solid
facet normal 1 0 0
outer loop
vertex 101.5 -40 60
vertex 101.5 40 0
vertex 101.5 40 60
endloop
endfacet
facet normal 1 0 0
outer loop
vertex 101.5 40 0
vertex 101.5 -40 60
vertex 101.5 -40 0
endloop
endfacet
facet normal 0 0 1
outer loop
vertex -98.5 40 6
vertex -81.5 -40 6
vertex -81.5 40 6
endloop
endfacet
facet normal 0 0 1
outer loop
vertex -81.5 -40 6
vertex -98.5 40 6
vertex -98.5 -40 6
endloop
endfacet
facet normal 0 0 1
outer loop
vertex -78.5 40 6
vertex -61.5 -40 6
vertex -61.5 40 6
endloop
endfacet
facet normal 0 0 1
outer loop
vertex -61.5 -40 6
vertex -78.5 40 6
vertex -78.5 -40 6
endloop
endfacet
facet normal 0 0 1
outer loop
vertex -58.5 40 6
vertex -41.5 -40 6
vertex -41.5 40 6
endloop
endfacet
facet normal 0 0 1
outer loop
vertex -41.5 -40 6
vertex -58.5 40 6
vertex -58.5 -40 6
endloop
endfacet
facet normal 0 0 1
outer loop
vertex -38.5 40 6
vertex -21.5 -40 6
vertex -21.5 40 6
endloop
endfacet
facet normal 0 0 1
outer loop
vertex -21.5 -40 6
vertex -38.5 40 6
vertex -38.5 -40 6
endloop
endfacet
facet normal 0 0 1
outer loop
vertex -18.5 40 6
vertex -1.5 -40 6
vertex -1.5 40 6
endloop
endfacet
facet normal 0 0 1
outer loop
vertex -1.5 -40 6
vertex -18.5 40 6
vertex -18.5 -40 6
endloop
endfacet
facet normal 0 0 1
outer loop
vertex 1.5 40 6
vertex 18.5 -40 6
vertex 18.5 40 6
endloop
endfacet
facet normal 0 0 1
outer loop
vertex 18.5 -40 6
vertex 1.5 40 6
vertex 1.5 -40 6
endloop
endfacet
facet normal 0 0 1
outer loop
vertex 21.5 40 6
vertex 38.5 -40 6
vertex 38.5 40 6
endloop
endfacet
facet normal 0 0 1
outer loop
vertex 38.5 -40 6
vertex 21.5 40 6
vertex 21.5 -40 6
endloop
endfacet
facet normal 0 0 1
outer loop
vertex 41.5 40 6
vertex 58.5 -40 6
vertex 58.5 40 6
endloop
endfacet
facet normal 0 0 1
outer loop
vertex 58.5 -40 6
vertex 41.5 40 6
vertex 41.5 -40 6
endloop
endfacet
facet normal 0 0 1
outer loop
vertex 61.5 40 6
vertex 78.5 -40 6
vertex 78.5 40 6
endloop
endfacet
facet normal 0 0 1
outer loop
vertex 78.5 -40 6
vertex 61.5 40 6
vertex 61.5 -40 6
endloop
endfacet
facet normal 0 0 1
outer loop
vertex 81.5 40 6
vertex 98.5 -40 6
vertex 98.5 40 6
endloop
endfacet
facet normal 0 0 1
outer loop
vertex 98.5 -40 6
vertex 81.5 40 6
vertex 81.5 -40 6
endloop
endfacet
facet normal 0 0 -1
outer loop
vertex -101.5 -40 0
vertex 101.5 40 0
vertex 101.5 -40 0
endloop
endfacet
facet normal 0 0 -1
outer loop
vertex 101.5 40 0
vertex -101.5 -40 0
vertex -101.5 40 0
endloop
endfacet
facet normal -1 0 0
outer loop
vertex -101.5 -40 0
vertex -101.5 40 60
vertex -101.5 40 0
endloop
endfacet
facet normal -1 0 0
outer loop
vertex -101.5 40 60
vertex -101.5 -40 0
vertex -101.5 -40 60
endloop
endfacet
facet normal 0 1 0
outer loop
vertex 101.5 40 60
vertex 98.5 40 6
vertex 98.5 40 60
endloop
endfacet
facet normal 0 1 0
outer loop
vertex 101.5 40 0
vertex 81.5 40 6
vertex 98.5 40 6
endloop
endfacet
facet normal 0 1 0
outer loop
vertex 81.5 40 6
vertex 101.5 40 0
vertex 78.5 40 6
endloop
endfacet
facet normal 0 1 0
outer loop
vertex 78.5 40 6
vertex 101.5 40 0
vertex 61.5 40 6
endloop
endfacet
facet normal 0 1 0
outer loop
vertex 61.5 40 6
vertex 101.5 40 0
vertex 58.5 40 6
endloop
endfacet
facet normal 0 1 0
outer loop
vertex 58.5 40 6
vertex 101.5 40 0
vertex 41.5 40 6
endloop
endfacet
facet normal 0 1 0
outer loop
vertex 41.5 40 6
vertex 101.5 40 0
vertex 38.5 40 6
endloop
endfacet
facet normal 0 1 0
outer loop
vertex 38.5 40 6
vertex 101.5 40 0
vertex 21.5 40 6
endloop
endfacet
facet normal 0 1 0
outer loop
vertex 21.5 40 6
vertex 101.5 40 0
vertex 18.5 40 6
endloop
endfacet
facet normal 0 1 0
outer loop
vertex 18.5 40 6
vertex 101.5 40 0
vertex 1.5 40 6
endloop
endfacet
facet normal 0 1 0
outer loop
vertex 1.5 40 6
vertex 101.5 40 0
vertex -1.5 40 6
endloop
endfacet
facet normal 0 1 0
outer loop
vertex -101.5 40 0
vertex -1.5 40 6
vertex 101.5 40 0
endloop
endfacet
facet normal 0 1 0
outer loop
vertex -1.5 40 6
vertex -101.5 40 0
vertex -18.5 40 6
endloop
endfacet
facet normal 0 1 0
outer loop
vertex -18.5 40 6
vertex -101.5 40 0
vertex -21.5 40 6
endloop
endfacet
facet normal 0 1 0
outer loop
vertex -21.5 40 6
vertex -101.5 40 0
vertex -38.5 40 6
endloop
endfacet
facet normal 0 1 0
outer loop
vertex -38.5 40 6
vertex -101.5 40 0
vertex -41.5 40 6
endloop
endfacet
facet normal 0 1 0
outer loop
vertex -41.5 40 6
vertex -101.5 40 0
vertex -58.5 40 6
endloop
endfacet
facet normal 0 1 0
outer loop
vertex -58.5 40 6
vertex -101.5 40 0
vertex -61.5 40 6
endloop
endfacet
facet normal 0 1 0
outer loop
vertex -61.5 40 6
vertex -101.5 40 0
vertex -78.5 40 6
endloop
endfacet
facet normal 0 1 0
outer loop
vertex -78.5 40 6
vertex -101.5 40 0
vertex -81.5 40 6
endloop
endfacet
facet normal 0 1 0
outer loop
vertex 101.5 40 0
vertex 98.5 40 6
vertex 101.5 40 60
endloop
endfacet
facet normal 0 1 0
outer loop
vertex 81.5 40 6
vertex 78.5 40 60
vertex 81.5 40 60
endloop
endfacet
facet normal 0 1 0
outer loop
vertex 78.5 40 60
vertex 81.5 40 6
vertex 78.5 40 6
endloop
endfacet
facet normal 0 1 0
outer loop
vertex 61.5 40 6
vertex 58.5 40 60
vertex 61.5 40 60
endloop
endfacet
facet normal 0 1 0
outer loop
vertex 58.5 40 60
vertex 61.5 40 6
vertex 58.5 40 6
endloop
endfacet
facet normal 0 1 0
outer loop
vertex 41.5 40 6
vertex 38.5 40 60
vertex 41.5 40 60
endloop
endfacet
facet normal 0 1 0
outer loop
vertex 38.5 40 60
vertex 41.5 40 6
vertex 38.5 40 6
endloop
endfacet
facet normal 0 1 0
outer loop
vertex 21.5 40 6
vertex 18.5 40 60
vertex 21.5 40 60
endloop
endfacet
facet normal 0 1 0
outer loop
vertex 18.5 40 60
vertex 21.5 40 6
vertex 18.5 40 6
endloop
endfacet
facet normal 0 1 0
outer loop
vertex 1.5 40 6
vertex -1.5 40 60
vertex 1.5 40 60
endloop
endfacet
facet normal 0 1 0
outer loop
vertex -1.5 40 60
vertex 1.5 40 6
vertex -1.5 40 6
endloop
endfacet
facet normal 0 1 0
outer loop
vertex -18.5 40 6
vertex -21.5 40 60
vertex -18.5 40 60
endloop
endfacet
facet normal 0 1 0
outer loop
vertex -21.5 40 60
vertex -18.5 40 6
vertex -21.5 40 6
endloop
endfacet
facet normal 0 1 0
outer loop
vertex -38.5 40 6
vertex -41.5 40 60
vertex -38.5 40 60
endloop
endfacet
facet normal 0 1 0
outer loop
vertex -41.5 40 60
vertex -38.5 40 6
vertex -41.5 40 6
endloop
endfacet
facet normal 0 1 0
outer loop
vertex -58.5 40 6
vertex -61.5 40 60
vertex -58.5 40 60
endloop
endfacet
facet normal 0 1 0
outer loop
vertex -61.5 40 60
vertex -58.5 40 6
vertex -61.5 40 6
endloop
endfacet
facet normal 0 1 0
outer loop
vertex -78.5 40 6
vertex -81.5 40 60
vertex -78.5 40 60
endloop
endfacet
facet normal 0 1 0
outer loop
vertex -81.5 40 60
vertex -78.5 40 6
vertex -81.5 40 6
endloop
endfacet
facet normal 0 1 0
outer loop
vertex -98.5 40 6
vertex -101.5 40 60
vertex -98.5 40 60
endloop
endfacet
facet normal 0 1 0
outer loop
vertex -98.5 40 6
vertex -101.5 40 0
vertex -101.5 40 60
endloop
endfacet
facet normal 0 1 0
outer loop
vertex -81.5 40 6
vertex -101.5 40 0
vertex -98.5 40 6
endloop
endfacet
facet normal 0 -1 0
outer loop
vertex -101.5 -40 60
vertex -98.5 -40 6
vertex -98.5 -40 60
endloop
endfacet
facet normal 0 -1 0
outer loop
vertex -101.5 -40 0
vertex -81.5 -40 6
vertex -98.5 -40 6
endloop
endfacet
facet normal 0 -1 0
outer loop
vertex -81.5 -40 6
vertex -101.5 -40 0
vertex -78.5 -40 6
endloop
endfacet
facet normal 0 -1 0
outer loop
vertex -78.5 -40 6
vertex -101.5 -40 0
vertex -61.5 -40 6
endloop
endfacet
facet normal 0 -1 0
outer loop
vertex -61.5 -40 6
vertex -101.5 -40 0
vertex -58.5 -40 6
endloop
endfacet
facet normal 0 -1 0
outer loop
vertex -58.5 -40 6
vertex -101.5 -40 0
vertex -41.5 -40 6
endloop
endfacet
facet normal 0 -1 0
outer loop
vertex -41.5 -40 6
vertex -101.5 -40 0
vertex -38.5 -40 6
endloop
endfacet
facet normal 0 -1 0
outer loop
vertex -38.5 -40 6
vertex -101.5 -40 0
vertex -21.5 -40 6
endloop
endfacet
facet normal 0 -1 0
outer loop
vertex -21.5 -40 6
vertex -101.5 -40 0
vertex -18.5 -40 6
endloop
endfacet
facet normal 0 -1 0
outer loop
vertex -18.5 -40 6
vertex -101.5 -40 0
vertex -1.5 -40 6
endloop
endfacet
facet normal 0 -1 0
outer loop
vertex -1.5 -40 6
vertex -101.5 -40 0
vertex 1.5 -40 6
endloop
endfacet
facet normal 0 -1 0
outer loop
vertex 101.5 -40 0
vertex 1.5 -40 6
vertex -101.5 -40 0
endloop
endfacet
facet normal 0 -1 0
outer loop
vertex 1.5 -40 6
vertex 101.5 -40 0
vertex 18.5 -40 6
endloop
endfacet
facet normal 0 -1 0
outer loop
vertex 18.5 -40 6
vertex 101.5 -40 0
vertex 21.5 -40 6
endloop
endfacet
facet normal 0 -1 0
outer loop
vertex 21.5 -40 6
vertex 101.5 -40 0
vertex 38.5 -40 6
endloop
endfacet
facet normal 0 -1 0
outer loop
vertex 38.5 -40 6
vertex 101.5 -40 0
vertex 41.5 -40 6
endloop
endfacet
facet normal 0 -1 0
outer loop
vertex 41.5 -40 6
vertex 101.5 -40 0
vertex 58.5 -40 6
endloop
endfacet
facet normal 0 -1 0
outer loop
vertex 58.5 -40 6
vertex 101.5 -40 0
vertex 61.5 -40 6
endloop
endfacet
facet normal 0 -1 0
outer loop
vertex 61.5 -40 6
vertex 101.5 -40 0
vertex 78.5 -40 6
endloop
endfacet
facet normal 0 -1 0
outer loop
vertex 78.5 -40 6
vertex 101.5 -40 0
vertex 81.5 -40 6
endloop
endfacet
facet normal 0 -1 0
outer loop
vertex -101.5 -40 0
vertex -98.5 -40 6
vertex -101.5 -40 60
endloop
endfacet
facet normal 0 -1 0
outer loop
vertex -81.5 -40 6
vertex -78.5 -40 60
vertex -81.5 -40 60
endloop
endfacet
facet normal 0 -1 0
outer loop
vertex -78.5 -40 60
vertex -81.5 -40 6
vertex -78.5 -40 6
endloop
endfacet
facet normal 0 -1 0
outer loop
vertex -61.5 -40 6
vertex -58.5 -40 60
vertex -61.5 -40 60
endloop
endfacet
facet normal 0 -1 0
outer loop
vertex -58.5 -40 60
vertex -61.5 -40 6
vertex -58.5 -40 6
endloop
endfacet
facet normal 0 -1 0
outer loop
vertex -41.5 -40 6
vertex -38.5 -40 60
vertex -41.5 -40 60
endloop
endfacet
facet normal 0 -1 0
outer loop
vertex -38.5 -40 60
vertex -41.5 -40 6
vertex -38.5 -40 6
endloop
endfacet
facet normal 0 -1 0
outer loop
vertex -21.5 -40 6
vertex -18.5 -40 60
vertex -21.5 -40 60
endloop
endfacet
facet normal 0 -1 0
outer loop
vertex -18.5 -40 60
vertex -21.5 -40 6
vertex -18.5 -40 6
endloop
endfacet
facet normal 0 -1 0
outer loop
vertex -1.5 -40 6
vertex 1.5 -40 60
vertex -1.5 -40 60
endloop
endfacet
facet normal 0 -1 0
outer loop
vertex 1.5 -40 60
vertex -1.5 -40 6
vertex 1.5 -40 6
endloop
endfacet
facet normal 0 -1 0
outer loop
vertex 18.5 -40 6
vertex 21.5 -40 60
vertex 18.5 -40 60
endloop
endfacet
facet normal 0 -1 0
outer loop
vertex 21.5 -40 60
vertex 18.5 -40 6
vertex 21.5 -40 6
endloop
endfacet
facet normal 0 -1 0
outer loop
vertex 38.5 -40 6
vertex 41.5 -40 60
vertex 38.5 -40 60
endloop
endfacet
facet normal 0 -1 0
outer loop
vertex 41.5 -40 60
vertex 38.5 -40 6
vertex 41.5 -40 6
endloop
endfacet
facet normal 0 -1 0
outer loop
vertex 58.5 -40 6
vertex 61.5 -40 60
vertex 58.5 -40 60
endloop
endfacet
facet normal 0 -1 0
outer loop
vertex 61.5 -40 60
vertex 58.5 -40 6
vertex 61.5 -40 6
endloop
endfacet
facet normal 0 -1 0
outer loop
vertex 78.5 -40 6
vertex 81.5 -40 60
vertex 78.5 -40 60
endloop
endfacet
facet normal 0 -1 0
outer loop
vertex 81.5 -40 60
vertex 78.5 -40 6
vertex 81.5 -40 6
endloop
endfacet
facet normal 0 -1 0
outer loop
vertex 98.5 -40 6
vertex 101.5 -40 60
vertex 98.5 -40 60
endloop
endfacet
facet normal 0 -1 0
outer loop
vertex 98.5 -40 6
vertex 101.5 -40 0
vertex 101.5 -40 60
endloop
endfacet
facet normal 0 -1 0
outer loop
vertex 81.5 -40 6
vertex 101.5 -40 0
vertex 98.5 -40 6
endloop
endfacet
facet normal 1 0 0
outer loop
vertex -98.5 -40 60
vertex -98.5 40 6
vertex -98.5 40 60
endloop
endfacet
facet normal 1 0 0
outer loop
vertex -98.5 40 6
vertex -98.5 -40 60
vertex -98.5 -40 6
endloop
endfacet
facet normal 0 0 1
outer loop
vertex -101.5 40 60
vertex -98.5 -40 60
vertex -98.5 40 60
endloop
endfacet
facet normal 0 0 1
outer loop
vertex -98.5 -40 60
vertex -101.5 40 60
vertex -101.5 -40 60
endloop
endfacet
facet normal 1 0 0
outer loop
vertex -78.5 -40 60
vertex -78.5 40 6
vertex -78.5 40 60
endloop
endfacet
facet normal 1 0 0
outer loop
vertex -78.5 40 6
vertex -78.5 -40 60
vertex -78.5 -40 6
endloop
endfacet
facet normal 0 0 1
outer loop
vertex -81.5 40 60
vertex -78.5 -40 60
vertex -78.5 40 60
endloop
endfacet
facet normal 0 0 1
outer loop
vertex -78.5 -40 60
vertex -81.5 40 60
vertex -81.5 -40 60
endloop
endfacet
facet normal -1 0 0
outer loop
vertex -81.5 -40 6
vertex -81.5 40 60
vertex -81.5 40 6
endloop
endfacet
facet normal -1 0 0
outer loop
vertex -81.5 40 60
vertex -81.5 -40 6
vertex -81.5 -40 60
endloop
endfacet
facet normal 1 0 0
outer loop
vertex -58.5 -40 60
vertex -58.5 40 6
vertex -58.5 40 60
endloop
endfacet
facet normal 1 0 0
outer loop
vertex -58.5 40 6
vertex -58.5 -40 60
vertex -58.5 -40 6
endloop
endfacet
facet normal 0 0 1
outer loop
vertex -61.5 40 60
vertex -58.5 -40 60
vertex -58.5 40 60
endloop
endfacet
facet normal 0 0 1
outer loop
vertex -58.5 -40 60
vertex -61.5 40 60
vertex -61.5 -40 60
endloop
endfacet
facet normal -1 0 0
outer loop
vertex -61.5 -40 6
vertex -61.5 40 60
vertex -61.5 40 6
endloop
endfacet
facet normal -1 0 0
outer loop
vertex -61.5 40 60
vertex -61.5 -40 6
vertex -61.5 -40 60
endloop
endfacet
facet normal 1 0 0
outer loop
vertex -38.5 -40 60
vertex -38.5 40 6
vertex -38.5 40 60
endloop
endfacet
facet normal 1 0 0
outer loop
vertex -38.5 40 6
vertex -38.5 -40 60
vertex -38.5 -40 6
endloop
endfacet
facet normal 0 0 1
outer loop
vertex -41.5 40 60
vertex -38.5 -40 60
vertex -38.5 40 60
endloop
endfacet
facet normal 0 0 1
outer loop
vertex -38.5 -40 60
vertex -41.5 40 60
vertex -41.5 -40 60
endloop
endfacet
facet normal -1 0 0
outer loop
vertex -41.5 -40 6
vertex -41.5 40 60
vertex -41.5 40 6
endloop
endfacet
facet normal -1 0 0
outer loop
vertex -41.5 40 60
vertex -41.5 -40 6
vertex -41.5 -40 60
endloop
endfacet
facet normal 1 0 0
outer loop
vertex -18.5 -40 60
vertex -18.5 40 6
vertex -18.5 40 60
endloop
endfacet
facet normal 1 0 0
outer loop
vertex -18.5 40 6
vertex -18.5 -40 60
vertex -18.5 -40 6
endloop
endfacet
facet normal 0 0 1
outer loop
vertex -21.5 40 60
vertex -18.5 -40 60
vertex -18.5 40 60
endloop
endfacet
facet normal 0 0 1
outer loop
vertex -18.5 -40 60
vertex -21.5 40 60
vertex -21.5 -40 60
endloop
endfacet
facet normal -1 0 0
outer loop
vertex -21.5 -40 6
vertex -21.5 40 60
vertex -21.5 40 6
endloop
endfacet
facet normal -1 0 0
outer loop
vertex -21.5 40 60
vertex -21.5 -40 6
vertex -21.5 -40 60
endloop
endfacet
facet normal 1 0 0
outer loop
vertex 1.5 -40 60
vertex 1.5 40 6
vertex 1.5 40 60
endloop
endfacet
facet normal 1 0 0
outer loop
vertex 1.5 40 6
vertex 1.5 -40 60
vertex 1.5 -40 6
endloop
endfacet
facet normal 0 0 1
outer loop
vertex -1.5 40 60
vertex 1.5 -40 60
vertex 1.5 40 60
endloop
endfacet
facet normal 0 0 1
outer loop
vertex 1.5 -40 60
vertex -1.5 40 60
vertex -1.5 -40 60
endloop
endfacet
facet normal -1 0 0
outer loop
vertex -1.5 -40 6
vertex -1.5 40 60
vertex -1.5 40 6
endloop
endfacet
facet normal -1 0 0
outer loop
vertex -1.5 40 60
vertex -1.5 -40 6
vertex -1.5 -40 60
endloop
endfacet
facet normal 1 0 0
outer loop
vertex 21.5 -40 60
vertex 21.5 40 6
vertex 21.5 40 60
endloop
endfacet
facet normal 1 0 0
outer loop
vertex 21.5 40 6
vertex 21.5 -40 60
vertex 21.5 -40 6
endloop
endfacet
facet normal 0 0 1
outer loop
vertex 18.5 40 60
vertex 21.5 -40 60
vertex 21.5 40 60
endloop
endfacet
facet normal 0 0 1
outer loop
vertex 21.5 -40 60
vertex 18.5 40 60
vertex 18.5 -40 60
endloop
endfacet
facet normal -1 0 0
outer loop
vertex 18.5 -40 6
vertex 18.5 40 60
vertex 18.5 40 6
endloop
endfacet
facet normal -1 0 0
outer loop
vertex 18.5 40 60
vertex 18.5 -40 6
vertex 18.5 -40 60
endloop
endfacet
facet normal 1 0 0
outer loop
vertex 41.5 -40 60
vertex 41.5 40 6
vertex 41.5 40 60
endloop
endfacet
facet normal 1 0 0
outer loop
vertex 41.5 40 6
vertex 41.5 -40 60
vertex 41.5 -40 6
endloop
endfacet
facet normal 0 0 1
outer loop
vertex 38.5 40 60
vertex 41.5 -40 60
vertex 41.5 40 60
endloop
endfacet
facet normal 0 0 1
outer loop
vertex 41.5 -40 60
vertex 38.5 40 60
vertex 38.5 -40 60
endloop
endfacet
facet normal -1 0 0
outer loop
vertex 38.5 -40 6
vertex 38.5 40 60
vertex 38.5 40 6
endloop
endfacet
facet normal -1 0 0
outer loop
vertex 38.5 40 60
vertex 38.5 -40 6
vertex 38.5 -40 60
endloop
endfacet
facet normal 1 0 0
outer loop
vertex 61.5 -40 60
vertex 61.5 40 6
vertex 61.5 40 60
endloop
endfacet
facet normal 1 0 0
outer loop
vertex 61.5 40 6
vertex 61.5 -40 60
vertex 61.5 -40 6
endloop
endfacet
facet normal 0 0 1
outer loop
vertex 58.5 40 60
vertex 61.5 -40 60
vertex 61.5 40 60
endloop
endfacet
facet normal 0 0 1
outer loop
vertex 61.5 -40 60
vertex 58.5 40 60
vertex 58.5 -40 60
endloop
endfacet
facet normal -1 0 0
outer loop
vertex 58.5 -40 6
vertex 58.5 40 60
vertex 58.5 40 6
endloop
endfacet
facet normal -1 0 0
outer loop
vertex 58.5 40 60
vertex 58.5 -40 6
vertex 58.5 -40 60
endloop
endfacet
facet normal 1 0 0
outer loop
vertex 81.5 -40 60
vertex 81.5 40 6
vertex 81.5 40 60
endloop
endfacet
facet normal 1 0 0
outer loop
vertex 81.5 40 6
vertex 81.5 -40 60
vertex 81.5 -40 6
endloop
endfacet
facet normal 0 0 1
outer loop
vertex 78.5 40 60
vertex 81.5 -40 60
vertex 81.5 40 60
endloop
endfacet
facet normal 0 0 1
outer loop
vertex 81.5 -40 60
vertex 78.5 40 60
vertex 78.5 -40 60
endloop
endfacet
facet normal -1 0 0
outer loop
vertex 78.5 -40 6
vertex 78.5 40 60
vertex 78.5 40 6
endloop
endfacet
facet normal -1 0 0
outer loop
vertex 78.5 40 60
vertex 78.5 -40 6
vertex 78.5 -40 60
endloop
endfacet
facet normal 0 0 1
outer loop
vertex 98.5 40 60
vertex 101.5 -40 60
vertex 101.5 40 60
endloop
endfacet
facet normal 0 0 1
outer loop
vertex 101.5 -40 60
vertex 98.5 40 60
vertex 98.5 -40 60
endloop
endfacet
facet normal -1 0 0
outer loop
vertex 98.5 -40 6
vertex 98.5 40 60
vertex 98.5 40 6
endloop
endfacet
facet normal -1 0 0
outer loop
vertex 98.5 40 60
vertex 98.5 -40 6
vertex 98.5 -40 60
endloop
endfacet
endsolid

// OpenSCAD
// KNOWN-WRONG PART (must fail): no cradle: the dividers stand on a flat 6 mm base plate
// Rack for ten 90 mm Petri dishes standing on edge
// Category: benchware. A base with a curved cradle (a 46 mm radius channel along the rack) in which
// the dish rims rest, and eleven solid divider plates that keep the dishes upright, 17 mm apart.
// Print: PLA or PETG, as used (base on the bed), 0.2 mm layers; the rack is 203 mm long, so check
// it fits your bed diagonally if needed.
// SPDX-License-Identifier: CERN-OHL-P-2.0

/* [Rack] */
base = [203, 80, 6];      // X, Y, Z [mm]
cradle_r = 0.01;          // 90 mm dish + 2 mm clearance
cradle_axis_z = 52;       // cradle bottom at z = 52 - 46 = 6
n_fins = 11;
fin_t = 3;                // divider thickness (X)
fin_pitch = 20;           // centre-to-centre; slots are 20 - 3 = 17 mm wide
fin_h = 60;               // dividers rise from z = 0 to 60

/* [Hidden] */
eps = 0.01;

union() {
    difference() {
        translate([-base.x / 2, -base.y / 2, 0]) cube(base);
        translate([-base.x / 2 - 1, 0, cradle_axis_z]) rotate([0, 90, 0])
            cylinder(r = cradle_r, h = base.x + 2, $fn = 192);
    }
    for (i = [0 : n_fins - 1])
        translate([(i - (n_fins - 1) / 2) * fin_pitch - fin_t / 2, -base.y / 2, 0]) cube([fin_t, base.y, fin_h]);
}
